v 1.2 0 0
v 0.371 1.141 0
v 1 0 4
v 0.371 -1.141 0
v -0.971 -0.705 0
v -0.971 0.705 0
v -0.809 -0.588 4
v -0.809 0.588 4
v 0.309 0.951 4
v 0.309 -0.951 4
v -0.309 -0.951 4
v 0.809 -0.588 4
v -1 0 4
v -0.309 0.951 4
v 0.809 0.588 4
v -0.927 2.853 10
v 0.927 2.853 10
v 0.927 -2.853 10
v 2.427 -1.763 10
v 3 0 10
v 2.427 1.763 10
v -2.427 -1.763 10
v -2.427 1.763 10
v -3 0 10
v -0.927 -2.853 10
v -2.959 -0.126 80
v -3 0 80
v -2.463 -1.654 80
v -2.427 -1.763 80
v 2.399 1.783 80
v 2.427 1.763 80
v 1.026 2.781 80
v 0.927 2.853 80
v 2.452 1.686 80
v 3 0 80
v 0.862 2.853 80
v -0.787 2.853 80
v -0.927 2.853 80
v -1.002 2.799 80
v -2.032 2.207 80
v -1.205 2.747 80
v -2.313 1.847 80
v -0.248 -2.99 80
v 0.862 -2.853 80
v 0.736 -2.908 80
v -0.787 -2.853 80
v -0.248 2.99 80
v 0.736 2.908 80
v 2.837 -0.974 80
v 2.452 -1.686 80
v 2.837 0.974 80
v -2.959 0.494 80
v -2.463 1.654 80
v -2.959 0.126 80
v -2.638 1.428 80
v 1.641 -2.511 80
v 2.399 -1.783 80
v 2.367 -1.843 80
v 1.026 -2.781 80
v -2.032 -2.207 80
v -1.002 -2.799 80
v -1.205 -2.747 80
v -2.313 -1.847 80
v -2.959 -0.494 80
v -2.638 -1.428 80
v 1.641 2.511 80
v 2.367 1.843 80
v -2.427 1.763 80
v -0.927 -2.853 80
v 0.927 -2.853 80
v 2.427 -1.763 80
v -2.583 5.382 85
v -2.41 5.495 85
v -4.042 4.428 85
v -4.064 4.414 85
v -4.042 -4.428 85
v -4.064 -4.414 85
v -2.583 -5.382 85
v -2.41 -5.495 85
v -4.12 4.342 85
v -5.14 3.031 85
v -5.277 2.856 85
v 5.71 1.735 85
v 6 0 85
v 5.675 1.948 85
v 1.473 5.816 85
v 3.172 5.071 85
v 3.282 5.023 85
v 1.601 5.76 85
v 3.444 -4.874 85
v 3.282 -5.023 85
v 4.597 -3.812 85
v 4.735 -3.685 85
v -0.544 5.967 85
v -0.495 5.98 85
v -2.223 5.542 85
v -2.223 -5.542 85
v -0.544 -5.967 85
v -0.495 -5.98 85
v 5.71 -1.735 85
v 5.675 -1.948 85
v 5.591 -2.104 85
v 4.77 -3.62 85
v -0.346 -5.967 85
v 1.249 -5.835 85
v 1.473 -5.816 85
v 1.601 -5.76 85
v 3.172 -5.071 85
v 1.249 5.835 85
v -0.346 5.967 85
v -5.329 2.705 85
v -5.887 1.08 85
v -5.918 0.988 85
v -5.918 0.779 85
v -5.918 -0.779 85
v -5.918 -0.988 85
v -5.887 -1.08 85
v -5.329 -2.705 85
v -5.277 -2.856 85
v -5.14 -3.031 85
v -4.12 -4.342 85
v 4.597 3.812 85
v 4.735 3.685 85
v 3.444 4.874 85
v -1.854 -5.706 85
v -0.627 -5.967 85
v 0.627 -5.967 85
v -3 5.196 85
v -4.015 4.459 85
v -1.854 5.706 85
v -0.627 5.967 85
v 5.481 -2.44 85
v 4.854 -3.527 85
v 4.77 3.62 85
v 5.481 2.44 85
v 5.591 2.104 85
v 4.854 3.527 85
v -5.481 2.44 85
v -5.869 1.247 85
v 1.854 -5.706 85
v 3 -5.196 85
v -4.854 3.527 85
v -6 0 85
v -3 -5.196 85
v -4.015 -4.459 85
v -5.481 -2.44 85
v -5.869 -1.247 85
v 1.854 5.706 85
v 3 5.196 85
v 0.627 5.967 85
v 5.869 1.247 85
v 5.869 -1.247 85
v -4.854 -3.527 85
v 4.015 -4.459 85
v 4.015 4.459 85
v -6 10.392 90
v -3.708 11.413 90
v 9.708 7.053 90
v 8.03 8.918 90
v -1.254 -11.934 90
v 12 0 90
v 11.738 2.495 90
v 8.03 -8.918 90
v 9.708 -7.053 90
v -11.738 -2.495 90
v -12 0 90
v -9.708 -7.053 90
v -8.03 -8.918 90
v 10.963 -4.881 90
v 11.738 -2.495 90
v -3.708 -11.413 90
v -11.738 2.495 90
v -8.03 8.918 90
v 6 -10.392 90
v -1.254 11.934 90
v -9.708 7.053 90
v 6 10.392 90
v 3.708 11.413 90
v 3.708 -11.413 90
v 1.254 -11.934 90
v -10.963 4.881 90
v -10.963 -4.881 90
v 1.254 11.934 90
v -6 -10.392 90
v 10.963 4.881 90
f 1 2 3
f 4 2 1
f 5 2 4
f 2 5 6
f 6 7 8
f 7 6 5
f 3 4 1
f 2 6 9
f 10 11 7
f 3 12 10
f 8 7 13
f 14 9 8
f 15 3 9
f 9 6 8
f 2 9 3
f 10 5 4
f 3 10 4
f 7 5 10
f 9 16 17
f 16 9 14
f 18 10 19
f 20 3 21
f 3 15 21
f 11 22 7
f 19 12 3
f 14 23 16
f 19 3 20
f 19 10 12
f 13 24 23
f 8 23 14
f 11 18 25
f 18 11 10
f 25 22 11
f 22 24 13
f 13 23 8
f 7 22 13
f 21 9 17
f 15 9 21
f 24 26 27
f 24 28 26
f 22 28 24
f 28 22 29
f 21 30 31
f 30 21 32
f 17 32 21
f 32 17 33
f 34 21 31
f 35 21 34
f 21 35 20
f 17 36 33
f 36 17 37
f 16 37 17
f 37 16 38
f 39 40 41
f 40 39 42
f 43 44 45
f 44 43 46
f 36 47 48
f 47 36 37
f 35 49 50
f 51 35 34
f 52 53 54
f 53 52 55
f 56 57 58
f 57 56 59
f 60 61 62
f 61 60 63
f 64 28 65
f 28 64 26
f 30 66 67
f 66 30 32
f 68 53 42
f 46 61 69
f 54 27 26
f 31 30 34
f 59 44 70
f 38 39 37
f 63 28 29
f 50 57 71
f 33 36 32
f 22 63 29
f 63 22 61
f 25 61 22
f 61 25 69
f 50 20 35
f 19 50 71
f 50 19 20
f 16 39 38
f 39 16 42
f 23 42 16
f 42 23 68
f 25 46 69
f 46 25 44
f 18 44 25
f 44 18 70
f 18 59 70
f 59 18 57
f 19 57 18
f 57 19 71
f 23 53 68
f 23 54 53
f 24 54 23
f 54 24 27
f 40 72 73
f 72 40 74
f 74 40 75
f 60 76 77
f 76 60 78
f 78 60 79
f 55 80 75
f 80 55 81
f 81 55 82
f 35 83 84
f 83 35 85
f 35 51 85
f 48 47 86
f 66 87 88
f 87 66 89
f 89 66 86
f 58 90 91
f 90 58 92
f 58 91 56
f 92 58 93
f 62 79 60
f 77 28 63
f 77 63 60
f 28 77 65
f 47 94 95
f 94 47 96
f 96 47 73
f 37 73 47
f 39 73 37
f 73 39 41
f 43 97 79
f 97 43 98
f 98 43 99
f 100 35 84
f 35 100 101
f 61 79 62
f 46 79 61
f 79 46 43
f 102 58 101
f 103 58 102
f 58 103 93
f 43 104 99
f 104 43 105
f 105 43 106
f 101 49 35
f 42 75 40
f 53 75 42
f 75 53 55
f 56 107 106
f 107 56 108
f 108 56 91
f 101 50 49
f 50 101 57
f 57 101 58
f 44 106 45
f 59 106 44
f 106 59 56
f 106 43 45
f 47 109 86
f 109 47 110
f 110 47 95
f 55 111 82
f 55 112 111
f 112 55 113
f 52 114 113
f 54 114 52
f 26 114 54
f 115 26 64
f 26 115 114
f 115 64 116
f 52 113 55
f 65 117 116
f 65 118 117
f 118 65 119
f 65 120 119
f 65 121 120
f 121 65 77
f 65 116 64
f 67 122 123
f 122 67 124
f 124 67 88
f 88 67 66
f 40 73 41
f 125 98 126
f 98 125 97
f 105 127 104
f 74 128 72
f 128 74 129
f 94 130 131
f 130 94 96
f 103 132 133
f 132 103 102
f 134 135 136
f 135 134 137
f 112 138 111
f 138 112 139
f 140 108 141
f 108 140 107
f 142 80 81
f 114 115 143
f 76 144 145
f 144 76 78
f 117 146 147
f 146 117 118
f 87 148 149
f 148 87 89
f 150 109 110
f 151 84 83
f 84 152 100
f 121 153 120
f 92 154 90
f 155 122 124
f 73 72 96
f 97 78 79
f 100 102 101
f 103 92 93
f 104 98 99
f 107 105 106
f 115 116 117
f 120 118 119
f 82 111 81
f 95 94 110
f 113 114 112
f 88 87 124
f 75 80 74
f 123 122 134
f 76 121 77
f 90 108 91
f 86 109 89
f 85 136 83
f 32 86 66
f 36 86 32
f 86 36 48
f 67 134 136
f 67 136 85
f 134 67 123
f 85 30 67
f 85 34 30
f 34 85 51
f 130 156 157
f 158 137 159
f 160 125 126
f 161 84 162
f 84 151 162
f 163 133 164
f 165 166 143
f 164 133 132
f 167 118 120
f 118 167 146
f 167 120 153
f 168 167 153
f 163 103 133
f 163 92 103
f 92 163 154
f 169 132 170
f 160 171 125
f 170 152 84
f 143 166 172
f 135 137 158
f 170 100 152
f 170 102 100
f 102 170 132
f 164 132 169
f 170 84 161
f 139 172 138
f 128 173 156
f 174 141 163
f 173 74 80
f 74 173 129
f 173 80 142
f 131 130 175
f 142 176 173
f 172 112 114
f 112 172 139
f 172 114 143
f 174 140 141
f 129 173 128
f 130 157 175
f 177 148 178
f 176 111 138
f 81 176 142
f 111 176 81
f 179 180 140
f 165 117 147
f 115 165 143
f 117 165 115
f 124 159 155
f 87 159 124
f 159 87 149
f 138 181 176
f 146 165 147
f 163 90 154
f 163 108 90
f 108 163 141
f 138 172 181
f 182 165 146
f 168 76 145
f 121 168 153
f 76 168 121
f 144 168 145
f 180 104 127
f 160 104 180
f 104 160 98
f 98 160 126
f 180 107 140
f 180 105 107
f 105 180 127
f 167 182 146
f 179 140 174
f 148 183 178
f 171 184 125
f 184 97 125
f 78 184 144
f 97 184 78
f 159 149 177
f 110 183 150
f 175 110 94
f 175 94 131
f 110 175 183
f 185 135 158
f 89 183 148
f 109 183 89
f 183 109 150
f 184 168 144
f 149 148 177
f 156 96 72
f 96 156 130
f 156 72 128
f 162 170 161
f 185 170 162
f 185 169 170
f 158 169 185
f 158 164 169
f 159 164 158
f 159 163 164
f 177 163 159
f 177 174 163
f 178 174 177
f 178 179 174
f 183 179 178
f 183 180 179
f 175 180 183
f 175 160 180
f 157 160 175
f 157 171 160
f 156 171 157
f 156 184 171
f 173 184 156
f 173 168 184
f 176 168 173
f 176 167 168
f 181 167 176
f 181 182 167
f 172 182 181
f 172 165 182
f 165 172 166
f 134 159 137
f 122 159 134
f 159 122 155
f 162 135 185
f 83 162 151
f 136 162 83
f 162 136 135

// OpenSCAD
        //4 gat
       translate([0,0,0])
       color([0,0,1]) cylinder(h=4,r1=1.2,r2=1,center=false);
       translate([0,0,4])
       color([0,1,0]) cylinder(h=6,r1=1,r2=3,center=false);
       translate([0,0,10])
        color([1,0,0]) cylinder(h=70,r1=3,r2=3,center=false);
       translate([0,0,80])
        color([1,0,0]) cylinder(h=5,r1=3,r2=6,center=false);
       translate([0,0,85])
        color([1,0,0]) cylinder(h=5,r1=6,r2=12,center=false);
